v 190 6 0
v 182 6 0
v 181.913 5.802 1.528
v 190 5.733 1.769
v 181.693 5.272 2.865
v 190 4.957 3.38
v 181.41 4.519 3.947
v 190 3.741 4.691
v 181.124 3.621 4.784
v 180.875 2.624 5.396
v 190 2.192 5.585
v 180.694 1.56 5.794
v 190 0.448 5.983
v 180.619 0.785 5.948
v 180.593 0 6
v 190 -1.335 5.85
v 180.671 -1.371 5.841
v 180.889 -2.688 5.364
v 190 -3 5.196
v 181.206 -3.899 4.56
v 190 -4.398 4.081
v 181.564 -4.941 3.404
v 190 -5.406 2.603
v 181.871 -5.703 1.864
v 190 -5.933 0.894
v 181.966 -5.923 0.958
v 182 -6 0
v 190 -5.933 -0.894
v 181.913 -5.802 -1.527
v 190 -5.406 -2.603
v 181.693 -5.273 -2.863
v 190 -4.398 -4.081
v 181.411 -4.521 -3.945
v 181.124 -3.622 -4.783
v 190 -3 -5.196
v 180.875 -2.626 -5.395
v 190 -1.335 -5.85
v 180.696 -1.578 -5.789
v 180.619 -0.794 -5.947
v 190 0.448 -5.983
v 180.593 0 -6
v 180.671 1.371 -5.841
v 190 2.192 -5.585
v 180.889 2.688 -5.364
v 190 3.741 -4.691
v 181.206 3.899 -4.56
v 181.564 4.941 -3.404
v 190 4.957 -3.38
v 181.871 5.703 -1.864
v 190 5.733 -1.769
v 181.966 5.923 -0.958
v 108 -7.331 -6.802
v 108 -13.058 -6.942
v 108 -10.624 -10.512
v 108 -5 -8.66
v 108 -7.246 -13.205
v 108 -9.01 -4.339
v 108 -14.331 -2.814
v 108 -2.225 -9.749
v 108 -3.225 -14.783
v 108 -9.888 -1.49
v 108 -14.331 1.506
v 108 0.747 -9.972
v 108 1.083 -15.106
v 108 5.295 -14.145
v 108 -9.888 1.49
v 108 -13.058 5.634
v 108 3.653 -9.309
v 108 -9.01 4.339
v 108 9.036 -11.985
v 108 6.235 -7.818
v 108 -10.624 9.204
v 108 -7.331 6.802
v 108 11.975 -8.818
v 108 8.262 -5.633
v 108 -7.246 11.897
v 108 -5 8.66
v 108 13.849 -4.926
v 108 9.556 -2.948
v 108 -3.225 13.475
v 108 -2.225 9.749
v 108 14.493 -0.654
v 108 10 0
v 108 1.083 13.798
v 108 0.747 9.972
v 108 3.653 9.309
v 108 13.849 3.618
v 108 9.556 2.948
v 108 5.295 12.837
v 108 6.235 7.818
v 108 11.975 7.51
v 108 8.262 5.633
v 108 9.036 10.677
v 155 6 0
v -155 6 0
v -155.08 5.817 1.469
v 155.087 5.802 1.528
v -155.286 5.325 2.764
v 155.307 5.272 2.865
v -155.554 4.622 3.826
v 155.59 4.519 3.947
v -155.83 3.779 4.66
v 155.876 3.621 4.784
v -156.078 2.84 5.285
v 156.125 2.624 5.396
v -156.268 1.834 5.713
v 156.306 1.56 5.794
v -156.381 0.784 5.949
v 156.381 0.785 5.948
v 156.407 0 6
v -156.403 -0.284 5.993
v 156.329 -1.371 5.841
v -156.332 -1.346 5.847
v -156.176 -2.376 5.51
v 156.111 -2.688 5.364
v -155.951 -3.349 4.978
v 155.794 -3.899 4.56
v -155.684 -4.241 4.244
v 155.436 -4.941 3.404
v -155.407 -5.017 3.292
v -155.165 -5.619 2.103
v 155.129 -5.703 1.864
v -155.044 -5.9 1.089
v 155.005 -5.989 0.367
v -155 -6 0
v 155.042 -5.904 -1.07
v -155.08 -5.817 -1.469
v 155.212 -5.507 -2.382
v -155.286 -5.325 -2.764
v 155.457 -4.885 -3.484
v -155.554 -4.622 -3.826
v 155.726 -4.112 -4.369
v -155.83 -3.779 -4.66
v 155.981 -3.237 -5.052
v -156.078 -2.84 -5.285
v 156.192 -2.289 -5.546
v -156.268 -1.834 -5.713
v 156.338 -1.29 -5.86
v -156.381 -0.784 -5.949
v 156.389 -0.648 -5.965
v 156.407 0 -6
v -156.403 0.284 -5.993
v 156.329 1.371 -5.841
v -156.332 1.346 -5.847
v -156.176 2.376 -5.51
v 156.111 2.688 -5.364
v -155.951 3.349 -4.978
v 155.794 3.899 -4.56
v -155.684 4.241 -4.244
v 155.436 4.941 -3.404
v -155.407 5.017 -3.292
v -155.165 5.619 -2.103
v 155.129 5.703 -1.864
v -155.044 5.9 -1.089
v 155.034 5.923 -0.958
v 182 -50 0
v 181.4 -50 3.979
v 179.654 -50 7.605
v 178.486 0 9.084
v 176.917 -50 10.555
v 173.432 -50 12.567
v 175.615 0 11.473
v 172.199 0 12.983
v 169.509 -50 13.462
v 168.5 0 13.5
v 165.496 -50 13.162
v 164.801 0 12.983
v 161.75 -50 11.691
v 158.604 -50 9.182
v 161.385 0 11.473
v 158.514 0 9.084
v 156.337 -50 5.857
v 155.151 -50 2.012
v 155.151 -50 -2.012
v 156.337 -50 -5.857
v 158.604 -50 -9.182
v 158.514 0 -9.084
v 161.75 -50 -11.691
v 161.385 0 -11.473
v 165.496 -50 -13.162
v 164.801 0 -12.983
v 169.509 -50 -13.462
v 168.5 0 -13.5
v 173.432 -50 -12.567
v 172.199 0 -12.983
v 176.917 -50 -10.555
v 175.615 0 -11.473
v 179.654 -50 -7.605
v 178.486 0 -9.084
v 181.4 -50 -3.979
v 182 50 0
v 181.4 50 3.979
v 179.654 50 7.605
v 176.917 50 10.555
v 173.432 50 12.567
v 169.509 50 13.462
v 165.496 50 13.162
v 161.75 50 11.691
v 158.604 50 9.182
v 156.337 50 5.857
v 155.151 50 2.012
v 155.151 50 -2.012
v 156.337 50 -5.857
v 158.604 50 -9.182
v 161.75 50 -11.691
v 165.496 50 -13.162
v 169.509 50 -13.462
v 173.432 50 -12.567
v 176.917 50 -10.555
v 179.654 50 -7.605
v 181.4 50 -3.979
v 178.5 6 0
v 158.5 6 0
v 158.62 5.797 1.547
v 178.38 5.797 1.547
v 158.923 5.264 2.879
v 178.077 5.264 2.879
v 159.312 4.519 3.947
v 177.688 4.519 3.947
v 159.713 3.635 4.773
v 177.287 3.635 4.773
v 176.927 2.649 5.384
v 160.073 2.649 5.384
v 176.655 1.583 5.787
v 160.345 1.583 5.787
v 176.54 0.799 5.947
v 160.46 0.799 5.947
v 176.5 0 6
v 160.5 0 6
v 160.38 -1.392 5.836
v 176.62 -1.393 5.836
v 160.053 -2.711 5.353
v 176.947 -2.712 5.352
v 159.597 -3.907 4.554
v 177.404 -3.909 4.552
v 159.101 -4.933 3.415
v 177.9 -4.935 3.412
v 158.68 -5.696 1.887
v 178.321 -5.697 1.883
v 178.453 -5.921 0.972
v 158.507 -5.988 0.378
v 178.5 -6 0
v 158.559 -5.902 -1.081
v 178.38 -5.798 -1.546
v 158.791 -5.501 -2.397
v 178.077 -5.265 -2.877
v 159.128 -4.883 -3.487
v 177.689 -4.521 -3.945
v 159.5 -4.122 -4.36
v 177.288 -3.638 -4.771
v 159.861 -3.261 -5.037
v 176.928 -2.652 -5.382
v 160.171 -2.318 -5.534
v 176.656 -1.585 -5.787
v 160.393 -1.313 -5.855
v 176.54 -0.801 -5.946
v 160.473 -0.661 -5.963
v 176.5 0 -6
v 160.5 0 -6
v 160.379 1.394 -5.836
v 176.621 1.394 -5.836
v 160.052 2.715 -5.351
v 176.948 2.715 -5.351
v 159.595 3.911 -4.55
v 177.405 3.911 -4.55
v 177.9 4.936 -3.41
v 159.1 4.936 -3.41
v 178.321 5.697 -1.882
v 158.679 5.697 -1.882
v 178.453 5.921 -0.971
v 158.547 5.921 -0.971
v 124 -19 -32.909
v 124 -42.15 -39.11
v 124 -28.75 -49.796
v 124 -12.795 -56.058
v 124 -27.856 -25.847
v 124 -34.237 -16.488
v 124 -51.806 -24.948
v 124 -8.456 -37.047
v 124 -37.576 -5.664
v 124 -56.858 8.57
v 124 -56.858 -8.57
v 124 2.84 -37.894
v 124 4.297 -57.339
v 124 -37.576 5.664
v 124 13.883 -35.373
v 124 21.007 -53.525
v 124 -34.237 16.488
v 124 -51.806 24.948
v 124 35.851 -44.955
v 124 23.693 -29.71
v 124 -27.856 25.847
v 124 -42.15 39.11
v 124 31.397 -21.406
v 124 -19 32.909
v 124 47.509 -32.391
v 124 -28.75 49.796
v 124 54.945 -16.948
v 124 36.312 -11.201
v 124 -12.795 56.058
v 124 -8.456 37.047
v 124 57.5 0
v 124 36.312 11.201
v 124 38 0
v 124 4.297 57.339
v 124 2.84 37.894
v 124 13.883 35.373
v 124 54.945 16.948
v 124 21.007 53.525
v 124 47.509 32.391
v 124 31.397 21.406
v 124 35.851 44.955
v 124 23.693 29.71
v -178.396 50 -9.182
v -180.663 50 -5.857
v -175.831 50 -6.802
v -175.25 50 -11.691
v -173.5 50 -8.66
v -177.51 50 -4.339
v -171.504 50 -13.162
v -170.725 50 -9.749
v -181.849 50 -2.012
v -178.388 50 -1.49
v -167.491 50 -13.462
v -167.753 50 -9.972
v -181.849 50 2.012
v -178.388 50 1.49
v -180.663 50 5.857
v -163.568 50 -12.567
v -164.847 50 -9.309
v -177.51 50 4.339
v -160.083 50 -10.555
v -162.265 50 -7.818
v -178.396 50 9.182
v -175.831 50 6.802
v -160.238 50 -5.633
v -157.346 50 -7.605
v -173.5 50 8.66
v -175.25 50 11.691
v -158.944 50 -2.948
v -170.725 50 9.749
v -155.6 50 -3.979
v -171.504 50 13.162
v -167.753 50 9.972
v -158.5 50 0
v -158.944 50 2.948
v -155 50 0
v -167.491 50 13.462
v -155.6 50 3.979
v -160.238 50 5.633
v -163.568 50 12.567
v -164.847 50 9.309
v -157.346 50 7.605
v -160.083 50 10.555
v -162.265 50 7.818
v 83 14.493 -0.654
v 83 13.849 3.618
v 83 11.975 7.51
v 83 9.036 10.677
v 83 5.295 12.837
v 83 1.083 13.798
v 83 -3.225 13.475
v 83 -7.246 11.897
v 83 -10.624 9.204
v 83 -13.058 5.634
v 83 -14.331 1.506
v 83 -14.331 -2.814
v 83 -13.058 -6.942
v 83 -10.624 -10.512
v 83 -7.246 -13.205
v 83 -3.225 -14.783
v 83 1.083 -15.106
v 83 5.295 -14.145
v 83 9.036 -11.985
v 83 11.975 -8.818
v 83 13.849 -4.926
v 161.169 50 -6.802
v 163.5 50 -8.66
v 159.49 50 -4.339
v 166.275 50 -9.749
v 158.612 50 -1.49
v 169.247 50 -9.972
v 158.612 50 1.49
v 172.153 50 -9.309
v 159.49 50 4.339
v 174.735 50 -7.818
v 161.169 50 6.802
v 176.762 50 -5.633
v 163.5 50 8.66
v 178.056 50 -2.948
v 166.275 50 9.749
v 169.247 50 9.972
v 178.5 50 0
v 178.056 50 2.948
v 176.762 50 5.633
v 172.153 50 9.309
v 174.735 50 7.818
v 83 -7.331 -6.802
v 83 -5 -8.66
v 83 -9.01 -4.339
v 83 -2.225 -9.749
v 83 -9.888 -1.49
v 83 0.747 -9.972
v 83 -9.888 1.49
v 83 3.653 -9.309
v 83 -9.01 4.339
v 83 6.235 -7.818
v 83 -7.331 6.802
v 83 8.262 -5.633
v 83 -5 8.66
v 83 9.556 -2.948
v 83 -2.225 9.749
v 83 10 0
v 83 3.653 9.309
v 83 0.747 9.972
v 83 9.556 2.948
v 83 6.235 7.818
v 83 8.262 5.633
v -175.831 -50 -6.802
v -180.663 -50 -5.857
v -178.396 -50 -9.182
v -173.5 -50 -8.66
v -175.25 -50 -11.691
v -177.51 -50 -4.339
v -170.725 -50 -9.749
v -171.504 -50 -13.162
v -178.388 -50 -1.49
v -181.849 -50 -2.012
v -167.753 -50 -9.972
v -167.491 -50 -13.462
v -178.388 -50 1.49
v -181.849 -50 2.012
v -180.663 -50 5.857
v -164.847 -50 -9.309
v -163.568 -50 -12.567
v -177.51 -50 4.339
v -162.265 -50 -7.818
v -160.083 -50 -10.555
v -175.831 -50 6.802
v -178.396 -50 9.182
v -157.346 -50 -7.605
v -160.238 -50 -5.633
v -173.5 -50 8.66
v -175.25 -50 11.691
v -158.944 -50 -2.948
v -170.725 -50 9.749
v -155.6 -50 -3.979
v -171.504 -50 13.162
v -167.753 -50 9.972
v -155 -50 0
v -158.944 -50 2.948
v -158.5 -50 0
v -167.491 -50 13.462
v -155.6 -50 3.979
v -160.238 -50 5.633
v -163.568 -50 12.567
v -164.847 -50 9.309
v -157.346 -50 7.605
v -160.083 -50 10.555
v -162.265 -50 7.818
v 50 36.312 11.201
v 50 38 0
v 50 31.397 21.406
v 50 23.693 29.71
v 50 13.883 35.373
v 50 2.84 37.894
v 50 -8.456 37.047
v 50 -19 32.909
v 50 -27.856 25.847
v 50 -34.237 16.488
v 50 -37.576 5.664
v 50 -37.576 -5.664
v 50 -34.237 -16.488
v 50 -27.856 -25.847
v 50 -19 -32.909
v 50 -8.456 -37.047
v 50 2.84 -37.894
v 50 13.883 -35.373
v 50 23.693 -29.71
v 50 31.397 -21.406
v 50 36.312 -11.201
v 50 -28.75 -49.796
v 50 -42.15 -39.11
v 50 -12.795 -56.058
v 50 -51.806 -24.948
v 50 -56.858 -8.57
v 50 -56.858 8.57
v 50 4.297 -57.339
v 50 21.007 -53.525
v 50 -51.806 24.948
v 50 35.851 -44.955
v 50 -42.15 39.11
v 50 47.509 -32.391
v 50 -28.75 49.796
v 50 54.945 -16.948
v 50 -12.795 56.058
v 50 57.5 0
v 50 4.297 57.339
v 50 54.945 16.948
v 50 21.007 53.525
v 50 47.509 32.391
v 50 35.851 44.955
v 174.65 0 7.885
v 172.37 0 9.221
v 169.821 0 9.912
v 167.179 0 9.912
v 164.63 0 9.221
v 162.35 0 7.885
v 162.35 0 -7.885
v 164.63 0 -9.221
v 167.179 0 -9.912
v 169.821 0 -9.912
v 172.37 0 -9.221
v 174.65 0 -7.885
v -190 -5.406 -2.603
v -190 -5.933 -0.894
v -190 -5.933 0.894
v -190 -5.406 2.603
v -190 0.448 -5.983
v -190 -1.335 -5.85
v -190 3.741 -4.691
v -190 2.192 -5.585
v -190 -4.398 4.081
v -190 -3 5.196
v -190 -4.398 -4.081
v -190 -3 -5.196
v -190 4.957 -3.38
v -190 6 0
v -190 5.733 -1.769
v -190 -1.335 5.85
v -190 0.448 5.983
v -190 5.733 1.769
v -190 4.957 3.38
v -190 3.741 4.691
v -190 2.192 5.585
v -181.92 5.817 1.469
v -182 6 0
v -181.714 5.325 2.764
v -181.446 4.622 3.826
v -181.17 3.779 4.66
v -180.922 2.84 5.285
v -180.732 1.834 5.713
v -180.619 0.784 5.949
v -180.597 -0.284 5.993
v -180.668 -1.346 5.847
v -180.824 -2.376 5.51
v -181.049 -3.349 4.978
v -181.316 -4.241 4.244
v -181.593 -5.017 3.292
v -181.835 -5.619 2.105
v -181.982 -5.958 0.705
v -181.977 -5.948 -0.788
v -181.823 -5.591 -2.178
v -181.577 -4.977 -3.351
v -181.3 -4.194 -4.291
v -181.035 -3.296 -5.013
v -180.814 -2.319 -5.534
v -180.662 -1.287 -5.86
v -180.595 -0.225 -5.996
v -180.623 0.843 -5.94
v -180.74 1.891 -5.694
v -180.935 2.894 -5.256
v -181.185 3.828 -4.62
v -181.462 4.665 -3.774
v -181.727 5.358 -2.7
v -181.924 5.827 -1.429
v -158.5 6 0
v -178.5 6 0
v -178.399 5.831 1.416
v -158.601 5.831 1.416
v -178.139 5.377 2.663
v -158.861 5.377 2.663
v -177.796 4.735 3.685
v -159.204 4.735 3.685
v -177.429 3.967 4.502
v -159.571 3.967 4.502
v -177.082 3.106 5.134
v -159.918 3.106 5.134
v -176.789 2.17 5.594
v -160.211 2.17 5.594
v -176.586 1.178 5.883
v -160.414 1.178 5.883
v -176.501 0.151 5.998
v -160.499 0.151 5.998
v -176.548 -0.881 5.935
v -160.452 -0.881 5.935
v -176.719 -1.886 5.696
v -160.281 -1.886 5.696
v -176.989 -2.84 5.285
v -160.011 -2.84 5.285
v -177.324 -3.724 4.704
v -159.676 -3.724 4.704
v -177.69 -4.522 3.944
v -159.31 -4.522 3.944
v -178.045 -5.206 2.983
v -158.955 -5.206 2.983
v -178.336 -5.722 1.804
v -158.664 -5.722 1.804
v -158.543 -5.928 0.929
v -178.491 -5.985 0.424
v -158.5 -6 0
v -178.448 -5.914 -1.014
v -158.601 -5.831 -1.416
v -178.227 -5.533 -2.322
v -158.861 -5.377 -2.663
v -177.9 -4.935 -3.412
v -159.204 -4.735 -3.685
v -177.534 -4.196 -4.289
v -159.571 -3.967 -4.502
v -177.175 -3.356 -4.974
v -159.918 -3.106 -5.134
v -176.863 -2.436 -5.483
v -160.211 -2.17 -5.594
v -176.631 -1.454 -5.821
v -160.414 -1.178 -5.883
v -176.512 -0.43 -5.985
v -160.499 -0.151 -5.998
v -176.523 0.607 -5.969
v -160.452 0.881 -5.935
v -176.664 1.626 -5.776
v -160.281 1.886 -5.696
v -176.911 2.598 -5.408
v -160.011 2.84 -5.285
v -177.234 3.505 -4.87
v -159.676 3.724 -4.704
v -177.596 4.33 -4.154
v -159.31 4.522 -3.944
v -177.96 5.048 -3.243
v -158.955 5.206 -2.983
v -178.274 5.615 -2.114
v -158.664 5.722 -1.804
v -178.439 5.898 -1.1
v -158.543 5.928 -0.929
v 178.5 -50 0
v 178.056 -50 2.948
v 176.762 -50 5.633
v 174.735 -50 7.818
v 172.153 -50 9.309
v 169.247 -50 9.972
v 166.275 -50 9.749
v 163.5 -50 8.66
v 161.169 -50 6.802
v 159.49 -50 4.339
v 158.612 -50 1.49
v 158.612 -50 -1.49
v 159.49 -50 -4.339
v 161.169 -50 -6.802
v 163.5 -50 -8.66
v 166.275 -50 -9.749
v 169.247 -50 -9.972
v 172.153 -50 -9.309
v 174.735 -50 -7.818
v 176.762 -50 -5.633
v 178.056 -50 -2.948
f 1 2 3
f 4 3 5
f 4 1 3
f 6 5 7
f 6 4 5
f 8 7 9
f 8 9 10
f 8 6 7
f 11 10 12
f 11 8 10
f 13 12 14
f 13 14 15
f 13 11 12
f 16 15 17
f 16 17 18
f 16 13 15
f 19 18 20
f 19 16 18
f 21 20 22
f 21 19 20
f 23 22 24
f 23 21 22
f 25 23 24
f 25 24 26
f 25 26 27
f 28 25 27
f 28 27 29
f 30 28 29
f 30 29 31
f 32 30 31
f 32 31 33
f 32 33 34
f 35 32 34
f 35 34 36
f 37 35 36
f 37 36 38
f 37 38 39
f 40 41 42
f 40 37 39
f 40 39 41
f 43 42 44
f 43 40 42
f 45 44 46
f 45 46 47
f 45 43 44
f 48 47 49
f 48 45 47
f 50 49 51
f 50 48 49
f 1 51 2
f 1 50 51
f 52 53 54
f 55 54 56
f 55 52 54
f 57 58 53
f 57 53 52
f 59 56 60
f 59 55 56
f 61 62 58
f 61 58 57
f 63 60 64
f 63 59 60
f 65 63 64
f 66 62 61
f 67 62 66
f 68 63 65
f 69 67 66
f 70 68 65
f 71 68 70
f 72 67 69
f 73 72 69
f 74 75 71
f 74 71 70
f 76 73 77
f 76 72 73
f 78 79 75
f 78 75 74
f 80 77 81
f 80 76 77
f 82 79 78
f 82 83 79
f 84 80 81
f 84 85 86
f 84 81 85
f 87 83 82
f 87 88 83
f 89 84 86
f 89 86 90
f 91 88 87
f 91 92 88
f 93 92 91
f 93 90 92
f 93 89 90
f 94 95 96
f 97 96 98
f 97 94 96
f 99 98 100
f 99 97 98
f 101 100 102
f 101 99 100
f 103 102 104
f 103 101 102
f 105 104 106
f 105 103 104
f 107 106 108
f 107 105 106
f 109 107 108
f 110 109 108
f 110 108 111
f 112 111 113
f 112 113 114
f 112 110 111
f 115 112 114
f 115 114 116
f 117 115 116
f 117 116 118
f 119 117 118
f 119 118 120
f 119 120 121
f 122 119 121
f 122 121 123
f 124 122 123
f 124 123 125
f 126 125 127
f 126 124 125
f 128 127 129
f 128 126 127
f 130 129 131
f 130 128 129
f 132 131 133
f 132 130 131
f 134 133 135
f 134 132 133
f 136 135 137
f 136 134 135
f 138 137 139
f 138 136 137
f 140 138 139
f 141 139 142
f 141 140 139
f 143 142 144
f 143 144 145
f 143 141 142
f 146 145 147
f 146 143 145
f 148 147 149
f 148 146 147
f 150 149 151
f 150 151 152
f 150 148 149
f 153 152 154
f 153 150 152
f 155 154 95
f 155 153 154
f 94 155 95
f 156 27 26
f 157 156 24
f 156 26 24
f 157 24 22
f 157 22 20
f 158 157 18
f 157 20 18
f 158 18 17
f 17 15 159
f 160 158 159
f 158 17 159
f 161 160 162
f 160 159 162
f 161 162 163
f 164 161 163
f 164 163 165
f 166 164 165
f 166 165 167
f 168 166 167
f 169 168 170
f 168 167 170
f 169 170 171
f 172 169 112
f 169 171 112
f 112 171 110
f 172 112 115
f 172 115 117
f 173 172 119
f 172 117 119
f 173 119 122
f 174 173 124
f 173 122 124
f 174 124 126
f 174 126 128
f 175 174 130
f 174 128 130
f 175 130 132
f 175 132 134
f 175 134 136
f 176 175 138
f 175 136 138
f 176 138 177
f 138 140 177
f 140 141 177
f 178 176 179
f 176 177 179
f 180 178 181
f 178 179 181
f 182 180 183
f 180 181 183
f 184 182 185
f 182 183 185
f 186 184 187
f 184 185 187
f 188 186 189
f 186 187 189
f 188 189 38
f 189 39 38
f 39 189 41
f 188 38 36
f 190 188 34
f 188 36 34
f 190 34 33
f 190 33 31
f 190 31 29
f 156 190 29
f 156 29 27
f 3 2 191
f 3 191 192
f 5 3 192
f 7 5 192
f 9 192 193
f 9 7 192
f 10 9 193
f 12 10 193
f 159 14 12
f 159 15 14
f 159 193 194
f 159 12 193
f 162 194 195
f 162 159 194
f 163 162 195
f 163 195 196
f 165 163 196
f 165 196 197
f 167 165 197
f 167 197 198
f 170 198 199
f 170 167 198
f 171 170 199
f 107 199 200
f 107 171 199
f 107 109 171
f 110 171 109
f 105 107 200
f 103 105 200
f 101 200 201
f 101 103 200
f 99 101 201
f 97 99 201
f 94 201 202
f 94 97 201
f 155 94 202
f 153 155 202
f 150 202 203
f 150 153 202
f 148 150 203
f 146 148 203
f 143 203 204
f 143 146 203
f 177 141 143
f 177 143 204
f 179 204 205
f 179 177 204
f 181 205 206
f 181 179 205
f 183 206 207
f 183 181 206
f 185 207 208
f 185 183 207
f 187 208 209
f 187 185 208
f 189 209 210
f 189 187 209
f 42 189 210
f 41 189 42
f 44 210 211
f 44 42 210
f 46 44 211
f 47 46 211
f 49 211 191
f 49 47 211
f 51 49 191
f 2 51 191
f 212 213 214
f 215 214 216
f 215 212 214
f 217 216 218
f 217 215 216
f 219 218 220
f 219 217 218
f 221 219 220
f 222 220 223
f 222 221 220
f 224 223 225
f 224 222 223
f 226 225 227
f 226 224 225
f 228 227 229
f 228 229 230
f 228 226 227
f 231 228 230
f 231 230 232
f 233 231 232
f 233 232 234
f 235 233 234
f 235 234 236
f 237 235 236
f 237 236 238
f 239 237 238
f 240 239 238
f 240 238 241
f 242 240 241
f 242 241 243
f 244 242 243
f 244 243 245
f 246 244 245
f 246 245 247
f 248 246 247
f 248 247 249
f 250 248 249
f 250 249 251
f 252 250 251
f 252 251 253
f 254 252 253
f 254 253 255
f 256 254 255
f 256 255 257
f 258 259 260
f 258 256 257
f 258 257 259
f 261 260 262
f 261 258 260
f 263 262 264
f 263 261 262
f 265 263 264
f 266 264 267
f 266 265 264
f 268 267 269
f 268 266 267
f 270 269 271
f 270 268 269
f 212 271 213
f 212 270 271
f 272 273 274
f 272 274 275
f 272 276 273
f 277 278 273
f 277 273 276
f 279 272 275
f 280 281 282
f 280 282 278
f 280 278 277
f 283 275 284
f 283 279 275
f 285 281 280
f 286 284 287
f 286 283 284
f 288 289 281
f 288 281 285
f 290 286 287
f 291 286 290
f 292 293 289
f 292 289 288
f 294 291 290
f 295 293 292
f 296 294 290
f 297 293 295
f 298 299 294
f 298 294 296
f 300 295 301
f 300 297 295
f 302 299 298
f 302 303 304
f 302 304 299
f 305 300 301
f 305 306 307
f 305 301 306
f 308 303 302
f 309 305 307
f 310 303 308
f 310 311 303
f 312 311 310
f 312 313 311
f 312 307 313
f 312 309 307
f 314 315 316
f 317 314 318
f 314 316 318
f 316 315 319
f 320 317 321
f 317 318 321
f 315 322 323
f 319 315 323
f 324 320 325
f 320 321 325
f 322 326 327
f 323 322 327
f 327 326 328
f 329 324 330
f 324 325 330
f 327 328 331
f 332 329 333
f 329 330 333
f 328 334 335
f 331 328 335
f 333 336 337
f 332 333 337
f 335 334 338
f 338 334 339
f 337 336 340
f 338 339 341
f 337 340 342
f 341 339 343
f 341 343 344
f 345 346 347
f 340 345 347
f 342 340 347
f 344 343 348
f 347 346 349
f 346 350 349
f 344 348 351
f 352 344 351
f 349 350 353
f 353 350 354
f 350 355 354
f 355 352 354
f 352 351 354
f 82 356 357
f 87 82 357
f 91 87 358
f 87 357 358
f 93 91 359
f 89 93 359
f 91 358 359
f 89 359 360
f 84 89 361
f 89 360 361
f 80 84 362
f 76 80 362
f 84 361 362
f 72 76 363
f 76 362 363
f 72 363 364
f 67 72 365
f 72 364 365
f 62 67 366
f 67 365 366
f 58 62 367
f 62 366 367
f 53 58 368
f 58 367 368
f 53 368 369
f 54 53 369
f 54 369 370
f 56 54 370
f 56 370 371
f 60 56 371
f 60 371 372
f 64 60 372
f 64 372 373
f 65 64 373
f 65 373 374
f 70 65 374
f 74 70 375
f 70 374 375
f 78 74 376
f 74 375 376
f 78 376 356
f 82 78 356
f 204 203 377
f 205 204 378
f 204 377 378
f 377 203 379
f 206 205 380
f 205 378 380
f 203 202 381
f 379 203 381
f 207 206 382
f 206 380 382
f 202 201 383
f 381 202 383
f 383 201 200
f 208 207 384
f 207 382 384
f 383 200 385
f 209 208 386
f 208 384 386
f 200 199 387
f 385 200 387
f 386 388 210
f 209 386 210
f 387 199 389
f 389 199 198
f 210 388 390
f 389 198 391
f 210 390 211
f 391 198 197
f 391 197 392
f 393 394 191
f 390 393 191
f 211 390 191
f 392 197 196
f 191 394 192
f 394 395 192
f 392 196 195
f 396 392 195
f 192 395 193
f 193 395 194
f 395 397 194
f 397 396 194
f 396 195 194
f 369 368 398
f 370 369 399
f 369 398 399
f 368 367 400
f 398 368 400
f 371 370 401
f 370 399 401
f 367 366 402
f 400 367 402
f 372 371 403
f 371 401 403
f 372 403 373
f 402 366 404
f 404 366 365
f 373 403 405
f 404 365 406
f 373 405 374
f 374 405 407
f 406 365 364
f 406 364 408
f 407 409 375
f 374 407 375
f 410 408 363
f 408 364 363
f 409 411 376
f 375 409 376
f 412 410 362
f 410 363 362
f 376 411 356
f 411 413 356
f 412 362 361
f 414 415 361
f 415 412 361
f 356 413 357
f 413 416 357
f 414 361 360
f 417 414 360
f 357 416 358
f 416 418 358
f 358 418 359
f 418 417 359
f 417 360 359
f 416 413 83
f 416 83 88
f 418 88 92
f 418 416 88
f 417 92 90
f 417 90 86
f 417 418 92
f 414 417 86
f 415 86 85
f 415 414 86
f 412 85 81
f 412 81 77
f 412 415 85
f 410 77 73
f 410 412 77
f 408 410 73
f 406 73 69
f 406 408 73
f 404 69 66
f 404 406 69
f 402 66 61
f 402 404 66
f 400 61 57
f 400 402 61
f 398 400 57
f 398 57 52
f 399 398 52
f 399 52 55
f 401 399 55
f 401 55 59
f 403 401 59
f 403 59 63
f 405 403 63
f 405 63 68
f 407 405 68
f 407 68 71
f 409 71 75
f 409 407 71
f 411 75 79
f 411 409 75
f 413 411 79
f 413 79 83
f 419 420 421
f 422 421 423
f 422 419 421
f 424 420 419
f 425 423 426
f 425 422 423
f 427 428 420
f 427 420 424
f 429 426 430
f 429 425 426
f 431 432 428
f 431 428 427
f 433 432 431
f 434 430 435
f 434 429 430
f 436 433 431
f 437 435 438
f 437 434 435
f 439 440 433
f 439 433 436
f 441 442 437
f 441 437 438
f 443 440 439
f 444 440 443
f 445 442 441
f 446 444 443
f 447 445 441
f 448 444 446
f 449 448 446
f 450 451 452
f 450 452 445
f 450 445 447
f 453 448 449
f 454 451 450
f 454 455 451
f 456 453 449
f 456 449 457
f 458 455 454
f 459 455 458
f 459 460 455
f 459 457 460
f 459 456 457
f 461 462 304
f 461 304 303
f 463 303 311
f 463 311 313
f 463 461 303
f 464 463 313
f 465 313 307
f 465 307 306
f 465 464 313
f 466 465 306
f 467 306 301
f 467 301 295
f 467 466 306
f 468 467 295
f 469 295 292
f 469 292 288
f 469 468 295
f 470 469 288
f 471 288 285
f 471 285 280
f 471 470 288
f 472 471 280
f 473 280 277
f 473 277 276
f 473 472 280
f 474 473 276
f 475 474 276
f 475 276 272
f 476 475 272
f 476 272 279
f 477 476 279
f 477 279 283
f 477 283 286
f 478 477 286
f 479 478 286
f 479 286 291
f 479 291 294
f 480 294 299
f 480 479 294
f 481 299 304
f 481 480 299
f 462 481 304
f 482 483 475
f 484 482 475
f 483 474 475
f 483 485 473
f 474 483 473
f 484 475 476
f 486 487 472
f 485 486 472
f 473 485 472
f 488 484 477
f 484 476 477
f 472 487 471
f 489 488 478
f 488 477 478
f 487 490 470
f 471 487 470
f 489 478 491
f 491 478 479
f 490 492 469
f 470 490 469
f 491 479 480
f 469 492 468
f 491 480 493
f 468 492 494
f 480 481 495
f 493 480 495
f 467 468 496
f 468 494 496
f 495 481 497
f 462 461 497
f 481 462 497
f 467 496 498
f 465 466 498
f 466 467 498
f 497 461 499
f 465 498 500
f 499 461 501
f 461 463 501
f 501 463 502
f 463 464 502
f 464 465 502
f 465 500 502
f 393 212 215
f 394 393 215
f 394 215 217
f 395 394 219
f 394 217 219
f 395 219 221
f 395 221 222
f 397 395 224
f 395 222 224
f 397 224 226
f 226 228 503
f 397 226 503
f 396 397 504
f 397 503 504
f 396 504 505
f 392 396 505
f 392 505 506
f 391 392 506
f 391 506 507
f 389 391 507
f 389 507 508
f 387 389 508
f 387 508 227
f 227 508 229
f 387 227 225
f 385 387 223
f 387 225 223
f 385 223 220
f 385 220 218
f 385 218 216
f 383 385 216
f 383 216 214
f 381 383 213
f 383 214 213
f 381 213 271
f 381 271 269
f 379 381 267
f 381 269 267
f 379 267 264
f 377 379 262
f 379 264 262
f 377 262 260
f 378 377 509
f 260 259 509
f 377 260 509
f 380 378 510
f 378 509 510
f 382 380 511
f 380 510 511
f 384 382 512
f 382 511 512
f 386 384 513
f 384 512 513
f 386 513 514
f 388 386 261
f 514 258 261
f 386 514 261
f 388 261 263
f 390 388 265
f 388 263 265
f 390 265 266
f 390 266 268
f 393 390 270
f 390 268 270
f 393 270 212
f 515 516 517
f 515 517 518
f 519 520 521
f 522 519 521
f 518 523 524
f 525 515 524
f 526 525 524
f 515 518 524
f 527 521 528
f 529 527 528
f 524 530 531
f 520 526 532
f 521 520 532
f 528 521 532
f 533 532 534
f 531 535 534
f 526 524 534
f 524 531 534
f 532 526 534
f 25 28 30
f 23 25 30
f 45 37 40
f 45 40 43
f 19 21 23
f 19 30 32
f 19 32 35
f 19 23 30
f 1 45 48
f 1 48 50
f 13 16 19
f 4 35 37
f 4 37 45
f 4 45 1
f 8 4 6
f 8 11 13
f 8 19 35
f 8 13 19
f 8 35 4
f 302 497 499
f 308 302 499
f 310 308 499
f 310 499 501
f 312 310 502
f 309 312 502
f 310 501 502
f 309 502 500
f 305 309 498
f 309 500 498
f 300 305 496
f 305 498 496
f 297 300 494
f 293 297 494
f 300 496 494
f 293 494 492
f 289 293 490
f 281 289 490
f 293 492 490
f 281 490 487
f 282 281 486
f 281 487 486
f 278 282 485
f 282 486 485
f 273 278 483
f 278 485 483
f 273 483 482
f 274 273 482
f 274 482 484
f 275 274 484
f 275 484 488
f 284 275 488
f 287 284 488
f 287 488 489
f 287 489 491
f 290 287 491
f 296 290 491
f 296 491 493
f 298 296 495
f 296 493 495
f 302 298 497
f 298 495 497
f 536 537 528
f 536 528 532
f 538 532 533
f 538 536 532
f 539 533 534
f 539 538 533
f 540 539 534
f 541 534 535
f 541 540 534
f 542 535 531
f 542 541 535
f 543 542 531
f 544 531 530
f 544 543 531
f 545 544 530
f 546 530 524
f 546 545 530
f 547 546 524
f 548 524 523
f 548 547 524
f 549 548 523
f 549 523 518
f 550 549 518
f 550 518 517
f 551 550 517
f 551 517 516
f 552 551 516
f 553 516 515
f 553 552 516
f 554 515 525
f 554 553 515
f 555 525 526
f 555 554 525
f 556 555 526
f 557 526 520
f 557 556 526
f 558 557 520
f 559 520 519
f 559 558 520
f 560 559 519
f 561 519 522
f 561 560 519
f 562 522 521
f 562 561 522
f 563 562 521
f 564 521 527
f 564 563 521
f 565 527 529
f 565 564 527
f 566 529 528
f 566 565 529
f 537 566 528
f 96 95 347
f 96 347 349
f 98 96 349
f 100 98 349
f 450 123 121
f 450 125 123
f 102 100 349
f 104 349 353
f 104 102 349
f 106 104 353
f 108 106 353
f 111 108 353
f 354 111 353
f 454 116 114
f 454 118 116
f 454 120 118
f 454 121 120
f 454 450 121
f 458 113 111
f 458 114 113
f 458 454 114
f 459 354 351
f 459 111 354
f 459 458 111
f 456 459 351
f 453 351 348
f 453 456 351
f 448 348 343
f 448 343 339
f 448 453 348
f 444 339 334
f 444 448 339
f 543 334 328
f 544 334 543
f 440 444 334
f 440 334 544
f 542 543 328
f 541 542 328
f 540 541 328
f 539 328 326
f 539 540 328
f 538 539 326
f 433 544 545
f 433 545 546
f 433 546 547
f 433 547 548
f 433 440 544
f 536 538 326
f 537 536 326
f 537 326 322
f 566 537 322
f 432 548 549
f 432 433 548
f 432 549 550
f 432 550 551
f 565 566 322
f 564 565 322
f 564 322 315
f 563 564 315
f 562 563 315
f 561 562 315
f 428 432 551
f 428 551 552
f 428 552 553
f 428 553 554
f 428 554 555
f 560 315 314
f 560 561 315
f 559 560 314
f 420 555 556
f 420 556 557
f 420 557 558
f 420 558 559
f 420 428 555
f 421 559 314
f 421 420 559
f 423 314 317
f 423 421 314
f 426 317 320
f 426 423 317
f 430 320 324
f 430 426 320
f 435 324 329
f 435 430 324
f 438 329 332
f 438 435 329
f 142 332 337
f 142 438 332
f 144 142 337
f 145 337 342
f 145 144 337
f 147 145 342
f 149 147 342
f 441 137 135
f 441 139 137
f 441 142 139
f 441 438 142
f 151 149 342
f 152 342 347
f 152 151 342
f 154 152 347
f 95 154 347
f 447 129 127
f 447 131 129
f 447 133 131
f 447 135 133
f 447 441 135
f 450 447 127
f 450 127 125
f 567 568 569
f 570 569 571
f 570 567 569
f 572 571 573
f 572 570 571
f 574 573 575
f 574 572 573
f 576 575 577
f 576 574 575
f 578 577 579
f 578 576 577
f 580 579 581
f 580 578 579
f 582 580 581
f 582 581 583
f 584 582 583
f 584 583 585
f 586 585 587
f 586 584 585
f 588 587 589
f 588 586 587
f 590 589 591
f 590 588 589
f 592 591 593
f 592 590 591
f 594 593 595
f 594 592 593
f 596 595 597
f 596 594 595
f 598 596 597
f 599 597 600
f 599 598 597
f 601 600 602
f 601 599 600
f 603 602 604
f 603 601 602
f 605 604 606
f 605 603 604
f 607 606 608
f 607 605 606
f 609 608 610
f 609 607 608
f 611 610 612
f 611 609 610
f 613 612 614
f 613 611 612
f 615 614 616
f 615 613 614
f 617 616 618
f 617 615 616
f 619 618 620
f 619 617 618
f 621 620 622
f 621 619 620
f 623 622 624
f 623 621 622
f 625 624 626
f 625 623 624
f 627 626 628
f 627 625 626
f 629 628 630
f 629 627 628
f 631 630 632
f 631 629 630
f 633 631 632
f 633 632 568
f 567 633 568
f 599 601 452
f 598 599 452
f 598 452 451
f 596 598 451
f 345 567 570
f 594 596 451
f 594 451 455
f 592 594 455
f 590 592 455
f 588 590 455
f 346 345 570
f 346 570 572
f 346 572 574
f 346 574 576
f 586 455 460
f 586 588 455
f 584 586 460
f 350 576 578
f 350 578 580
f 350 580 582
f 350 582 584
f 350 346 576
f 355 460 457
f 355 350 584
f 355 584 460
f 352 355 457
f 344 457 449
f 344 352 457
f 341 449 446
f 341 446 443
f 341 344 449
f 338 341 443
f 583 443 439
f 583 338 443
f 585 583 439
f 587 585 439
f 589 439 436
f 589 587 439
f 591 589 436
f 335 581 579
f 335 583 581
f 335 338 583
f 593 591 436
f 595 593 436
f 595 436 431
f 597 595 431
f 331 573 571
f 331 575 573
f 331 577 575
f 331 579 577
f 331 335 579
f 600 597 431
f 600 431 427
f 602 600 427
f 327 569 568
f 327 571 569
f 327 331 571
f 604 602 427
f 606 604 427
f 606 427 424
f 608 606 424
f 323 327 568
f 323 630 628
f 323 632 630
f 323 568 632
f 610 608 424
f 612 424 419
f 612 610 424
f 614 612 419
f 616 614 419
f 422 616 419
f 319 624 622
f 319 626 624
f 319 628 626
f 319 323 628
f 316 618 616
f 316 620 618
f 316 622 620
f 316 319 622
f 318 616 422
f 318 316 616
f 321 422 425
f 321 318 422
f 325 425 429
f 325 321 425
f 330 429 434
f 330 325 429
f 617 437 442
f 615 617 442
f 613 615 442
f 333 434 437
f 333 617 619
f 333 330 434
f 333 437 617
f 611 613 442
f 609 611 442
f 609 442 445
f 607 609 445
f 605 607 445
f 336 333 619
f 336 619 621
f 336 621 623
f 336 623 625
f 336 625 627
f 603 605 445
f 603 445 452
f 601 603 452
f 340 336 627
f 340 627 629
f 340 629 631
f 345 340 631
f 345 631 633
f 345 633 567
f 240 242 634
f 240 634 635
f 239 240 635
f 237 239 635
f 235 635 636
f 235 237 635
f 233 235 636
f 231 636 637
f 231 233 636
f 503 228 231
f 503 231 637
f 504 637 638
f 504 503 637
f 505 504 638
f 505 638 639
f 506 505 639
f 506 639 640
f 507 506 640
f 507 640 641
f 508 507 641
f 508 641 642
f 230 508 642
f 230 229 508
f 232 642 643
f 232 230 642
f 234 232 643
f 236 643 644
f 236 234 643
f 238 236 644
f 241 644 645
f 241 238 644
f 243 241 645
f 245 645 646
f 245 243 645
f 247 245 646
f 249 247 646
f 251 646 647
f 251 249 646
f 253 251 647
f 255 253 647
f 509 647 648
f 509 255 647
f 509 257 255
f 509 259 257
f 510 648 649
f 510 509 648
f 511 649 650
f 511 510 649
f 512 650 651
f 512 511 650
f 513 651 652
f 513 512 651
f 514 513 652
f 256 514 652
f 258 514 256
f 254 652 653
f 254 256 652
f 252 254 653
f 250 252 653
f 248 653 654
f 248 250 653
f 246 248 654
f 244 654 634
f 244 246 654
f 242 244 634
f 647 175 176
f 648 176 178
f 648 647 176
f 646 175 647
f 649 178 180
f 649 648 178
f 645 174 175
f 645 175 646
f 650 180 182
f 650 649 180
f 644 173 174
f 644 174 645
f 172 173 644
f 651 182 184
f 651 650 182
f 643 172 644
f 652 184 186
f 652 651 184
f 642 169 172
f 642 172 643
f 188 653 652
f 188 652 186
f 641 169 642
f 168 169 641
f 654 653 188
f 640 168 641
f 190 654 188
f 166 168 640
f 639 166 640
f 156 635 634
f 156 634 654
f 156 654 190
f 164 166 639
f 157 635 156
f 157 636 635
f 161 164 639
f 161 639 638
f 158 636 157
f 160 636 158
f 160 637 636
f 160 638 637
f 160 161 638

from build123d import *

# Parameters (mm, degrees)
F0_R     = 6
F1_DEPTH = 190
F2_R     = 13.5
F2_R_2   = 10
F3_DEPTH = 50
F5_R     = 57.5
F5_R_2   = 38
F6_DEPTH = 74
F8_R     = 14.492787
F8_R_2   = 10
F9_DEPTH = 25


with BuildPart() as f1:
    # F0 (on Right) → F1 (new body, symmetric)
    with BuildSketch(Plane.YZ):
        Circle(F0_R)
    extrude(amount=F1_DEPTH, both=True)

    # F2 (on Front) → F3 (join, symmetric)
    with BuildSketch(Plane.XZ):
        with Locations((168.5, 0)):
            Circle(F2_R)
        with Locations((168.5, 0)):
            Circle(F2_R_2, mode=Mode.SUBTRACT)
        with Locations((-168.5, 0)):
            Circle(F2_R)
        with Locations((-168.5, 0)):
            Circle(F2_R_2, mode=Mode.SUBTRACT)
    extrude(amount=F3_DEPTH, both=True)


with BuildPart() as f6:
    # F5 (on offset) → F6 (new body)
    with BuildSketch(Plane.YZ.offset(50)):
        Circle(F5_R)
        Circle(F5_R_2, mode=Mode.SUBTRACT)
    extrude(amount=F6_DEPTH)


with BuildPart() as f9:
    # F8 (on offset) → F9 (new body)
    with BuildSketch(Plane.YZ.offset(83)):
        with Locations((-1e-06, -0.653976)):
            Circle(F8_R)
        Circle(F8_R_2, mode=Mode.SUBTRACT)
    extrude(amount=F9_DEPTH)


solid = Compound([f1.part, f6.part, f9.part])
